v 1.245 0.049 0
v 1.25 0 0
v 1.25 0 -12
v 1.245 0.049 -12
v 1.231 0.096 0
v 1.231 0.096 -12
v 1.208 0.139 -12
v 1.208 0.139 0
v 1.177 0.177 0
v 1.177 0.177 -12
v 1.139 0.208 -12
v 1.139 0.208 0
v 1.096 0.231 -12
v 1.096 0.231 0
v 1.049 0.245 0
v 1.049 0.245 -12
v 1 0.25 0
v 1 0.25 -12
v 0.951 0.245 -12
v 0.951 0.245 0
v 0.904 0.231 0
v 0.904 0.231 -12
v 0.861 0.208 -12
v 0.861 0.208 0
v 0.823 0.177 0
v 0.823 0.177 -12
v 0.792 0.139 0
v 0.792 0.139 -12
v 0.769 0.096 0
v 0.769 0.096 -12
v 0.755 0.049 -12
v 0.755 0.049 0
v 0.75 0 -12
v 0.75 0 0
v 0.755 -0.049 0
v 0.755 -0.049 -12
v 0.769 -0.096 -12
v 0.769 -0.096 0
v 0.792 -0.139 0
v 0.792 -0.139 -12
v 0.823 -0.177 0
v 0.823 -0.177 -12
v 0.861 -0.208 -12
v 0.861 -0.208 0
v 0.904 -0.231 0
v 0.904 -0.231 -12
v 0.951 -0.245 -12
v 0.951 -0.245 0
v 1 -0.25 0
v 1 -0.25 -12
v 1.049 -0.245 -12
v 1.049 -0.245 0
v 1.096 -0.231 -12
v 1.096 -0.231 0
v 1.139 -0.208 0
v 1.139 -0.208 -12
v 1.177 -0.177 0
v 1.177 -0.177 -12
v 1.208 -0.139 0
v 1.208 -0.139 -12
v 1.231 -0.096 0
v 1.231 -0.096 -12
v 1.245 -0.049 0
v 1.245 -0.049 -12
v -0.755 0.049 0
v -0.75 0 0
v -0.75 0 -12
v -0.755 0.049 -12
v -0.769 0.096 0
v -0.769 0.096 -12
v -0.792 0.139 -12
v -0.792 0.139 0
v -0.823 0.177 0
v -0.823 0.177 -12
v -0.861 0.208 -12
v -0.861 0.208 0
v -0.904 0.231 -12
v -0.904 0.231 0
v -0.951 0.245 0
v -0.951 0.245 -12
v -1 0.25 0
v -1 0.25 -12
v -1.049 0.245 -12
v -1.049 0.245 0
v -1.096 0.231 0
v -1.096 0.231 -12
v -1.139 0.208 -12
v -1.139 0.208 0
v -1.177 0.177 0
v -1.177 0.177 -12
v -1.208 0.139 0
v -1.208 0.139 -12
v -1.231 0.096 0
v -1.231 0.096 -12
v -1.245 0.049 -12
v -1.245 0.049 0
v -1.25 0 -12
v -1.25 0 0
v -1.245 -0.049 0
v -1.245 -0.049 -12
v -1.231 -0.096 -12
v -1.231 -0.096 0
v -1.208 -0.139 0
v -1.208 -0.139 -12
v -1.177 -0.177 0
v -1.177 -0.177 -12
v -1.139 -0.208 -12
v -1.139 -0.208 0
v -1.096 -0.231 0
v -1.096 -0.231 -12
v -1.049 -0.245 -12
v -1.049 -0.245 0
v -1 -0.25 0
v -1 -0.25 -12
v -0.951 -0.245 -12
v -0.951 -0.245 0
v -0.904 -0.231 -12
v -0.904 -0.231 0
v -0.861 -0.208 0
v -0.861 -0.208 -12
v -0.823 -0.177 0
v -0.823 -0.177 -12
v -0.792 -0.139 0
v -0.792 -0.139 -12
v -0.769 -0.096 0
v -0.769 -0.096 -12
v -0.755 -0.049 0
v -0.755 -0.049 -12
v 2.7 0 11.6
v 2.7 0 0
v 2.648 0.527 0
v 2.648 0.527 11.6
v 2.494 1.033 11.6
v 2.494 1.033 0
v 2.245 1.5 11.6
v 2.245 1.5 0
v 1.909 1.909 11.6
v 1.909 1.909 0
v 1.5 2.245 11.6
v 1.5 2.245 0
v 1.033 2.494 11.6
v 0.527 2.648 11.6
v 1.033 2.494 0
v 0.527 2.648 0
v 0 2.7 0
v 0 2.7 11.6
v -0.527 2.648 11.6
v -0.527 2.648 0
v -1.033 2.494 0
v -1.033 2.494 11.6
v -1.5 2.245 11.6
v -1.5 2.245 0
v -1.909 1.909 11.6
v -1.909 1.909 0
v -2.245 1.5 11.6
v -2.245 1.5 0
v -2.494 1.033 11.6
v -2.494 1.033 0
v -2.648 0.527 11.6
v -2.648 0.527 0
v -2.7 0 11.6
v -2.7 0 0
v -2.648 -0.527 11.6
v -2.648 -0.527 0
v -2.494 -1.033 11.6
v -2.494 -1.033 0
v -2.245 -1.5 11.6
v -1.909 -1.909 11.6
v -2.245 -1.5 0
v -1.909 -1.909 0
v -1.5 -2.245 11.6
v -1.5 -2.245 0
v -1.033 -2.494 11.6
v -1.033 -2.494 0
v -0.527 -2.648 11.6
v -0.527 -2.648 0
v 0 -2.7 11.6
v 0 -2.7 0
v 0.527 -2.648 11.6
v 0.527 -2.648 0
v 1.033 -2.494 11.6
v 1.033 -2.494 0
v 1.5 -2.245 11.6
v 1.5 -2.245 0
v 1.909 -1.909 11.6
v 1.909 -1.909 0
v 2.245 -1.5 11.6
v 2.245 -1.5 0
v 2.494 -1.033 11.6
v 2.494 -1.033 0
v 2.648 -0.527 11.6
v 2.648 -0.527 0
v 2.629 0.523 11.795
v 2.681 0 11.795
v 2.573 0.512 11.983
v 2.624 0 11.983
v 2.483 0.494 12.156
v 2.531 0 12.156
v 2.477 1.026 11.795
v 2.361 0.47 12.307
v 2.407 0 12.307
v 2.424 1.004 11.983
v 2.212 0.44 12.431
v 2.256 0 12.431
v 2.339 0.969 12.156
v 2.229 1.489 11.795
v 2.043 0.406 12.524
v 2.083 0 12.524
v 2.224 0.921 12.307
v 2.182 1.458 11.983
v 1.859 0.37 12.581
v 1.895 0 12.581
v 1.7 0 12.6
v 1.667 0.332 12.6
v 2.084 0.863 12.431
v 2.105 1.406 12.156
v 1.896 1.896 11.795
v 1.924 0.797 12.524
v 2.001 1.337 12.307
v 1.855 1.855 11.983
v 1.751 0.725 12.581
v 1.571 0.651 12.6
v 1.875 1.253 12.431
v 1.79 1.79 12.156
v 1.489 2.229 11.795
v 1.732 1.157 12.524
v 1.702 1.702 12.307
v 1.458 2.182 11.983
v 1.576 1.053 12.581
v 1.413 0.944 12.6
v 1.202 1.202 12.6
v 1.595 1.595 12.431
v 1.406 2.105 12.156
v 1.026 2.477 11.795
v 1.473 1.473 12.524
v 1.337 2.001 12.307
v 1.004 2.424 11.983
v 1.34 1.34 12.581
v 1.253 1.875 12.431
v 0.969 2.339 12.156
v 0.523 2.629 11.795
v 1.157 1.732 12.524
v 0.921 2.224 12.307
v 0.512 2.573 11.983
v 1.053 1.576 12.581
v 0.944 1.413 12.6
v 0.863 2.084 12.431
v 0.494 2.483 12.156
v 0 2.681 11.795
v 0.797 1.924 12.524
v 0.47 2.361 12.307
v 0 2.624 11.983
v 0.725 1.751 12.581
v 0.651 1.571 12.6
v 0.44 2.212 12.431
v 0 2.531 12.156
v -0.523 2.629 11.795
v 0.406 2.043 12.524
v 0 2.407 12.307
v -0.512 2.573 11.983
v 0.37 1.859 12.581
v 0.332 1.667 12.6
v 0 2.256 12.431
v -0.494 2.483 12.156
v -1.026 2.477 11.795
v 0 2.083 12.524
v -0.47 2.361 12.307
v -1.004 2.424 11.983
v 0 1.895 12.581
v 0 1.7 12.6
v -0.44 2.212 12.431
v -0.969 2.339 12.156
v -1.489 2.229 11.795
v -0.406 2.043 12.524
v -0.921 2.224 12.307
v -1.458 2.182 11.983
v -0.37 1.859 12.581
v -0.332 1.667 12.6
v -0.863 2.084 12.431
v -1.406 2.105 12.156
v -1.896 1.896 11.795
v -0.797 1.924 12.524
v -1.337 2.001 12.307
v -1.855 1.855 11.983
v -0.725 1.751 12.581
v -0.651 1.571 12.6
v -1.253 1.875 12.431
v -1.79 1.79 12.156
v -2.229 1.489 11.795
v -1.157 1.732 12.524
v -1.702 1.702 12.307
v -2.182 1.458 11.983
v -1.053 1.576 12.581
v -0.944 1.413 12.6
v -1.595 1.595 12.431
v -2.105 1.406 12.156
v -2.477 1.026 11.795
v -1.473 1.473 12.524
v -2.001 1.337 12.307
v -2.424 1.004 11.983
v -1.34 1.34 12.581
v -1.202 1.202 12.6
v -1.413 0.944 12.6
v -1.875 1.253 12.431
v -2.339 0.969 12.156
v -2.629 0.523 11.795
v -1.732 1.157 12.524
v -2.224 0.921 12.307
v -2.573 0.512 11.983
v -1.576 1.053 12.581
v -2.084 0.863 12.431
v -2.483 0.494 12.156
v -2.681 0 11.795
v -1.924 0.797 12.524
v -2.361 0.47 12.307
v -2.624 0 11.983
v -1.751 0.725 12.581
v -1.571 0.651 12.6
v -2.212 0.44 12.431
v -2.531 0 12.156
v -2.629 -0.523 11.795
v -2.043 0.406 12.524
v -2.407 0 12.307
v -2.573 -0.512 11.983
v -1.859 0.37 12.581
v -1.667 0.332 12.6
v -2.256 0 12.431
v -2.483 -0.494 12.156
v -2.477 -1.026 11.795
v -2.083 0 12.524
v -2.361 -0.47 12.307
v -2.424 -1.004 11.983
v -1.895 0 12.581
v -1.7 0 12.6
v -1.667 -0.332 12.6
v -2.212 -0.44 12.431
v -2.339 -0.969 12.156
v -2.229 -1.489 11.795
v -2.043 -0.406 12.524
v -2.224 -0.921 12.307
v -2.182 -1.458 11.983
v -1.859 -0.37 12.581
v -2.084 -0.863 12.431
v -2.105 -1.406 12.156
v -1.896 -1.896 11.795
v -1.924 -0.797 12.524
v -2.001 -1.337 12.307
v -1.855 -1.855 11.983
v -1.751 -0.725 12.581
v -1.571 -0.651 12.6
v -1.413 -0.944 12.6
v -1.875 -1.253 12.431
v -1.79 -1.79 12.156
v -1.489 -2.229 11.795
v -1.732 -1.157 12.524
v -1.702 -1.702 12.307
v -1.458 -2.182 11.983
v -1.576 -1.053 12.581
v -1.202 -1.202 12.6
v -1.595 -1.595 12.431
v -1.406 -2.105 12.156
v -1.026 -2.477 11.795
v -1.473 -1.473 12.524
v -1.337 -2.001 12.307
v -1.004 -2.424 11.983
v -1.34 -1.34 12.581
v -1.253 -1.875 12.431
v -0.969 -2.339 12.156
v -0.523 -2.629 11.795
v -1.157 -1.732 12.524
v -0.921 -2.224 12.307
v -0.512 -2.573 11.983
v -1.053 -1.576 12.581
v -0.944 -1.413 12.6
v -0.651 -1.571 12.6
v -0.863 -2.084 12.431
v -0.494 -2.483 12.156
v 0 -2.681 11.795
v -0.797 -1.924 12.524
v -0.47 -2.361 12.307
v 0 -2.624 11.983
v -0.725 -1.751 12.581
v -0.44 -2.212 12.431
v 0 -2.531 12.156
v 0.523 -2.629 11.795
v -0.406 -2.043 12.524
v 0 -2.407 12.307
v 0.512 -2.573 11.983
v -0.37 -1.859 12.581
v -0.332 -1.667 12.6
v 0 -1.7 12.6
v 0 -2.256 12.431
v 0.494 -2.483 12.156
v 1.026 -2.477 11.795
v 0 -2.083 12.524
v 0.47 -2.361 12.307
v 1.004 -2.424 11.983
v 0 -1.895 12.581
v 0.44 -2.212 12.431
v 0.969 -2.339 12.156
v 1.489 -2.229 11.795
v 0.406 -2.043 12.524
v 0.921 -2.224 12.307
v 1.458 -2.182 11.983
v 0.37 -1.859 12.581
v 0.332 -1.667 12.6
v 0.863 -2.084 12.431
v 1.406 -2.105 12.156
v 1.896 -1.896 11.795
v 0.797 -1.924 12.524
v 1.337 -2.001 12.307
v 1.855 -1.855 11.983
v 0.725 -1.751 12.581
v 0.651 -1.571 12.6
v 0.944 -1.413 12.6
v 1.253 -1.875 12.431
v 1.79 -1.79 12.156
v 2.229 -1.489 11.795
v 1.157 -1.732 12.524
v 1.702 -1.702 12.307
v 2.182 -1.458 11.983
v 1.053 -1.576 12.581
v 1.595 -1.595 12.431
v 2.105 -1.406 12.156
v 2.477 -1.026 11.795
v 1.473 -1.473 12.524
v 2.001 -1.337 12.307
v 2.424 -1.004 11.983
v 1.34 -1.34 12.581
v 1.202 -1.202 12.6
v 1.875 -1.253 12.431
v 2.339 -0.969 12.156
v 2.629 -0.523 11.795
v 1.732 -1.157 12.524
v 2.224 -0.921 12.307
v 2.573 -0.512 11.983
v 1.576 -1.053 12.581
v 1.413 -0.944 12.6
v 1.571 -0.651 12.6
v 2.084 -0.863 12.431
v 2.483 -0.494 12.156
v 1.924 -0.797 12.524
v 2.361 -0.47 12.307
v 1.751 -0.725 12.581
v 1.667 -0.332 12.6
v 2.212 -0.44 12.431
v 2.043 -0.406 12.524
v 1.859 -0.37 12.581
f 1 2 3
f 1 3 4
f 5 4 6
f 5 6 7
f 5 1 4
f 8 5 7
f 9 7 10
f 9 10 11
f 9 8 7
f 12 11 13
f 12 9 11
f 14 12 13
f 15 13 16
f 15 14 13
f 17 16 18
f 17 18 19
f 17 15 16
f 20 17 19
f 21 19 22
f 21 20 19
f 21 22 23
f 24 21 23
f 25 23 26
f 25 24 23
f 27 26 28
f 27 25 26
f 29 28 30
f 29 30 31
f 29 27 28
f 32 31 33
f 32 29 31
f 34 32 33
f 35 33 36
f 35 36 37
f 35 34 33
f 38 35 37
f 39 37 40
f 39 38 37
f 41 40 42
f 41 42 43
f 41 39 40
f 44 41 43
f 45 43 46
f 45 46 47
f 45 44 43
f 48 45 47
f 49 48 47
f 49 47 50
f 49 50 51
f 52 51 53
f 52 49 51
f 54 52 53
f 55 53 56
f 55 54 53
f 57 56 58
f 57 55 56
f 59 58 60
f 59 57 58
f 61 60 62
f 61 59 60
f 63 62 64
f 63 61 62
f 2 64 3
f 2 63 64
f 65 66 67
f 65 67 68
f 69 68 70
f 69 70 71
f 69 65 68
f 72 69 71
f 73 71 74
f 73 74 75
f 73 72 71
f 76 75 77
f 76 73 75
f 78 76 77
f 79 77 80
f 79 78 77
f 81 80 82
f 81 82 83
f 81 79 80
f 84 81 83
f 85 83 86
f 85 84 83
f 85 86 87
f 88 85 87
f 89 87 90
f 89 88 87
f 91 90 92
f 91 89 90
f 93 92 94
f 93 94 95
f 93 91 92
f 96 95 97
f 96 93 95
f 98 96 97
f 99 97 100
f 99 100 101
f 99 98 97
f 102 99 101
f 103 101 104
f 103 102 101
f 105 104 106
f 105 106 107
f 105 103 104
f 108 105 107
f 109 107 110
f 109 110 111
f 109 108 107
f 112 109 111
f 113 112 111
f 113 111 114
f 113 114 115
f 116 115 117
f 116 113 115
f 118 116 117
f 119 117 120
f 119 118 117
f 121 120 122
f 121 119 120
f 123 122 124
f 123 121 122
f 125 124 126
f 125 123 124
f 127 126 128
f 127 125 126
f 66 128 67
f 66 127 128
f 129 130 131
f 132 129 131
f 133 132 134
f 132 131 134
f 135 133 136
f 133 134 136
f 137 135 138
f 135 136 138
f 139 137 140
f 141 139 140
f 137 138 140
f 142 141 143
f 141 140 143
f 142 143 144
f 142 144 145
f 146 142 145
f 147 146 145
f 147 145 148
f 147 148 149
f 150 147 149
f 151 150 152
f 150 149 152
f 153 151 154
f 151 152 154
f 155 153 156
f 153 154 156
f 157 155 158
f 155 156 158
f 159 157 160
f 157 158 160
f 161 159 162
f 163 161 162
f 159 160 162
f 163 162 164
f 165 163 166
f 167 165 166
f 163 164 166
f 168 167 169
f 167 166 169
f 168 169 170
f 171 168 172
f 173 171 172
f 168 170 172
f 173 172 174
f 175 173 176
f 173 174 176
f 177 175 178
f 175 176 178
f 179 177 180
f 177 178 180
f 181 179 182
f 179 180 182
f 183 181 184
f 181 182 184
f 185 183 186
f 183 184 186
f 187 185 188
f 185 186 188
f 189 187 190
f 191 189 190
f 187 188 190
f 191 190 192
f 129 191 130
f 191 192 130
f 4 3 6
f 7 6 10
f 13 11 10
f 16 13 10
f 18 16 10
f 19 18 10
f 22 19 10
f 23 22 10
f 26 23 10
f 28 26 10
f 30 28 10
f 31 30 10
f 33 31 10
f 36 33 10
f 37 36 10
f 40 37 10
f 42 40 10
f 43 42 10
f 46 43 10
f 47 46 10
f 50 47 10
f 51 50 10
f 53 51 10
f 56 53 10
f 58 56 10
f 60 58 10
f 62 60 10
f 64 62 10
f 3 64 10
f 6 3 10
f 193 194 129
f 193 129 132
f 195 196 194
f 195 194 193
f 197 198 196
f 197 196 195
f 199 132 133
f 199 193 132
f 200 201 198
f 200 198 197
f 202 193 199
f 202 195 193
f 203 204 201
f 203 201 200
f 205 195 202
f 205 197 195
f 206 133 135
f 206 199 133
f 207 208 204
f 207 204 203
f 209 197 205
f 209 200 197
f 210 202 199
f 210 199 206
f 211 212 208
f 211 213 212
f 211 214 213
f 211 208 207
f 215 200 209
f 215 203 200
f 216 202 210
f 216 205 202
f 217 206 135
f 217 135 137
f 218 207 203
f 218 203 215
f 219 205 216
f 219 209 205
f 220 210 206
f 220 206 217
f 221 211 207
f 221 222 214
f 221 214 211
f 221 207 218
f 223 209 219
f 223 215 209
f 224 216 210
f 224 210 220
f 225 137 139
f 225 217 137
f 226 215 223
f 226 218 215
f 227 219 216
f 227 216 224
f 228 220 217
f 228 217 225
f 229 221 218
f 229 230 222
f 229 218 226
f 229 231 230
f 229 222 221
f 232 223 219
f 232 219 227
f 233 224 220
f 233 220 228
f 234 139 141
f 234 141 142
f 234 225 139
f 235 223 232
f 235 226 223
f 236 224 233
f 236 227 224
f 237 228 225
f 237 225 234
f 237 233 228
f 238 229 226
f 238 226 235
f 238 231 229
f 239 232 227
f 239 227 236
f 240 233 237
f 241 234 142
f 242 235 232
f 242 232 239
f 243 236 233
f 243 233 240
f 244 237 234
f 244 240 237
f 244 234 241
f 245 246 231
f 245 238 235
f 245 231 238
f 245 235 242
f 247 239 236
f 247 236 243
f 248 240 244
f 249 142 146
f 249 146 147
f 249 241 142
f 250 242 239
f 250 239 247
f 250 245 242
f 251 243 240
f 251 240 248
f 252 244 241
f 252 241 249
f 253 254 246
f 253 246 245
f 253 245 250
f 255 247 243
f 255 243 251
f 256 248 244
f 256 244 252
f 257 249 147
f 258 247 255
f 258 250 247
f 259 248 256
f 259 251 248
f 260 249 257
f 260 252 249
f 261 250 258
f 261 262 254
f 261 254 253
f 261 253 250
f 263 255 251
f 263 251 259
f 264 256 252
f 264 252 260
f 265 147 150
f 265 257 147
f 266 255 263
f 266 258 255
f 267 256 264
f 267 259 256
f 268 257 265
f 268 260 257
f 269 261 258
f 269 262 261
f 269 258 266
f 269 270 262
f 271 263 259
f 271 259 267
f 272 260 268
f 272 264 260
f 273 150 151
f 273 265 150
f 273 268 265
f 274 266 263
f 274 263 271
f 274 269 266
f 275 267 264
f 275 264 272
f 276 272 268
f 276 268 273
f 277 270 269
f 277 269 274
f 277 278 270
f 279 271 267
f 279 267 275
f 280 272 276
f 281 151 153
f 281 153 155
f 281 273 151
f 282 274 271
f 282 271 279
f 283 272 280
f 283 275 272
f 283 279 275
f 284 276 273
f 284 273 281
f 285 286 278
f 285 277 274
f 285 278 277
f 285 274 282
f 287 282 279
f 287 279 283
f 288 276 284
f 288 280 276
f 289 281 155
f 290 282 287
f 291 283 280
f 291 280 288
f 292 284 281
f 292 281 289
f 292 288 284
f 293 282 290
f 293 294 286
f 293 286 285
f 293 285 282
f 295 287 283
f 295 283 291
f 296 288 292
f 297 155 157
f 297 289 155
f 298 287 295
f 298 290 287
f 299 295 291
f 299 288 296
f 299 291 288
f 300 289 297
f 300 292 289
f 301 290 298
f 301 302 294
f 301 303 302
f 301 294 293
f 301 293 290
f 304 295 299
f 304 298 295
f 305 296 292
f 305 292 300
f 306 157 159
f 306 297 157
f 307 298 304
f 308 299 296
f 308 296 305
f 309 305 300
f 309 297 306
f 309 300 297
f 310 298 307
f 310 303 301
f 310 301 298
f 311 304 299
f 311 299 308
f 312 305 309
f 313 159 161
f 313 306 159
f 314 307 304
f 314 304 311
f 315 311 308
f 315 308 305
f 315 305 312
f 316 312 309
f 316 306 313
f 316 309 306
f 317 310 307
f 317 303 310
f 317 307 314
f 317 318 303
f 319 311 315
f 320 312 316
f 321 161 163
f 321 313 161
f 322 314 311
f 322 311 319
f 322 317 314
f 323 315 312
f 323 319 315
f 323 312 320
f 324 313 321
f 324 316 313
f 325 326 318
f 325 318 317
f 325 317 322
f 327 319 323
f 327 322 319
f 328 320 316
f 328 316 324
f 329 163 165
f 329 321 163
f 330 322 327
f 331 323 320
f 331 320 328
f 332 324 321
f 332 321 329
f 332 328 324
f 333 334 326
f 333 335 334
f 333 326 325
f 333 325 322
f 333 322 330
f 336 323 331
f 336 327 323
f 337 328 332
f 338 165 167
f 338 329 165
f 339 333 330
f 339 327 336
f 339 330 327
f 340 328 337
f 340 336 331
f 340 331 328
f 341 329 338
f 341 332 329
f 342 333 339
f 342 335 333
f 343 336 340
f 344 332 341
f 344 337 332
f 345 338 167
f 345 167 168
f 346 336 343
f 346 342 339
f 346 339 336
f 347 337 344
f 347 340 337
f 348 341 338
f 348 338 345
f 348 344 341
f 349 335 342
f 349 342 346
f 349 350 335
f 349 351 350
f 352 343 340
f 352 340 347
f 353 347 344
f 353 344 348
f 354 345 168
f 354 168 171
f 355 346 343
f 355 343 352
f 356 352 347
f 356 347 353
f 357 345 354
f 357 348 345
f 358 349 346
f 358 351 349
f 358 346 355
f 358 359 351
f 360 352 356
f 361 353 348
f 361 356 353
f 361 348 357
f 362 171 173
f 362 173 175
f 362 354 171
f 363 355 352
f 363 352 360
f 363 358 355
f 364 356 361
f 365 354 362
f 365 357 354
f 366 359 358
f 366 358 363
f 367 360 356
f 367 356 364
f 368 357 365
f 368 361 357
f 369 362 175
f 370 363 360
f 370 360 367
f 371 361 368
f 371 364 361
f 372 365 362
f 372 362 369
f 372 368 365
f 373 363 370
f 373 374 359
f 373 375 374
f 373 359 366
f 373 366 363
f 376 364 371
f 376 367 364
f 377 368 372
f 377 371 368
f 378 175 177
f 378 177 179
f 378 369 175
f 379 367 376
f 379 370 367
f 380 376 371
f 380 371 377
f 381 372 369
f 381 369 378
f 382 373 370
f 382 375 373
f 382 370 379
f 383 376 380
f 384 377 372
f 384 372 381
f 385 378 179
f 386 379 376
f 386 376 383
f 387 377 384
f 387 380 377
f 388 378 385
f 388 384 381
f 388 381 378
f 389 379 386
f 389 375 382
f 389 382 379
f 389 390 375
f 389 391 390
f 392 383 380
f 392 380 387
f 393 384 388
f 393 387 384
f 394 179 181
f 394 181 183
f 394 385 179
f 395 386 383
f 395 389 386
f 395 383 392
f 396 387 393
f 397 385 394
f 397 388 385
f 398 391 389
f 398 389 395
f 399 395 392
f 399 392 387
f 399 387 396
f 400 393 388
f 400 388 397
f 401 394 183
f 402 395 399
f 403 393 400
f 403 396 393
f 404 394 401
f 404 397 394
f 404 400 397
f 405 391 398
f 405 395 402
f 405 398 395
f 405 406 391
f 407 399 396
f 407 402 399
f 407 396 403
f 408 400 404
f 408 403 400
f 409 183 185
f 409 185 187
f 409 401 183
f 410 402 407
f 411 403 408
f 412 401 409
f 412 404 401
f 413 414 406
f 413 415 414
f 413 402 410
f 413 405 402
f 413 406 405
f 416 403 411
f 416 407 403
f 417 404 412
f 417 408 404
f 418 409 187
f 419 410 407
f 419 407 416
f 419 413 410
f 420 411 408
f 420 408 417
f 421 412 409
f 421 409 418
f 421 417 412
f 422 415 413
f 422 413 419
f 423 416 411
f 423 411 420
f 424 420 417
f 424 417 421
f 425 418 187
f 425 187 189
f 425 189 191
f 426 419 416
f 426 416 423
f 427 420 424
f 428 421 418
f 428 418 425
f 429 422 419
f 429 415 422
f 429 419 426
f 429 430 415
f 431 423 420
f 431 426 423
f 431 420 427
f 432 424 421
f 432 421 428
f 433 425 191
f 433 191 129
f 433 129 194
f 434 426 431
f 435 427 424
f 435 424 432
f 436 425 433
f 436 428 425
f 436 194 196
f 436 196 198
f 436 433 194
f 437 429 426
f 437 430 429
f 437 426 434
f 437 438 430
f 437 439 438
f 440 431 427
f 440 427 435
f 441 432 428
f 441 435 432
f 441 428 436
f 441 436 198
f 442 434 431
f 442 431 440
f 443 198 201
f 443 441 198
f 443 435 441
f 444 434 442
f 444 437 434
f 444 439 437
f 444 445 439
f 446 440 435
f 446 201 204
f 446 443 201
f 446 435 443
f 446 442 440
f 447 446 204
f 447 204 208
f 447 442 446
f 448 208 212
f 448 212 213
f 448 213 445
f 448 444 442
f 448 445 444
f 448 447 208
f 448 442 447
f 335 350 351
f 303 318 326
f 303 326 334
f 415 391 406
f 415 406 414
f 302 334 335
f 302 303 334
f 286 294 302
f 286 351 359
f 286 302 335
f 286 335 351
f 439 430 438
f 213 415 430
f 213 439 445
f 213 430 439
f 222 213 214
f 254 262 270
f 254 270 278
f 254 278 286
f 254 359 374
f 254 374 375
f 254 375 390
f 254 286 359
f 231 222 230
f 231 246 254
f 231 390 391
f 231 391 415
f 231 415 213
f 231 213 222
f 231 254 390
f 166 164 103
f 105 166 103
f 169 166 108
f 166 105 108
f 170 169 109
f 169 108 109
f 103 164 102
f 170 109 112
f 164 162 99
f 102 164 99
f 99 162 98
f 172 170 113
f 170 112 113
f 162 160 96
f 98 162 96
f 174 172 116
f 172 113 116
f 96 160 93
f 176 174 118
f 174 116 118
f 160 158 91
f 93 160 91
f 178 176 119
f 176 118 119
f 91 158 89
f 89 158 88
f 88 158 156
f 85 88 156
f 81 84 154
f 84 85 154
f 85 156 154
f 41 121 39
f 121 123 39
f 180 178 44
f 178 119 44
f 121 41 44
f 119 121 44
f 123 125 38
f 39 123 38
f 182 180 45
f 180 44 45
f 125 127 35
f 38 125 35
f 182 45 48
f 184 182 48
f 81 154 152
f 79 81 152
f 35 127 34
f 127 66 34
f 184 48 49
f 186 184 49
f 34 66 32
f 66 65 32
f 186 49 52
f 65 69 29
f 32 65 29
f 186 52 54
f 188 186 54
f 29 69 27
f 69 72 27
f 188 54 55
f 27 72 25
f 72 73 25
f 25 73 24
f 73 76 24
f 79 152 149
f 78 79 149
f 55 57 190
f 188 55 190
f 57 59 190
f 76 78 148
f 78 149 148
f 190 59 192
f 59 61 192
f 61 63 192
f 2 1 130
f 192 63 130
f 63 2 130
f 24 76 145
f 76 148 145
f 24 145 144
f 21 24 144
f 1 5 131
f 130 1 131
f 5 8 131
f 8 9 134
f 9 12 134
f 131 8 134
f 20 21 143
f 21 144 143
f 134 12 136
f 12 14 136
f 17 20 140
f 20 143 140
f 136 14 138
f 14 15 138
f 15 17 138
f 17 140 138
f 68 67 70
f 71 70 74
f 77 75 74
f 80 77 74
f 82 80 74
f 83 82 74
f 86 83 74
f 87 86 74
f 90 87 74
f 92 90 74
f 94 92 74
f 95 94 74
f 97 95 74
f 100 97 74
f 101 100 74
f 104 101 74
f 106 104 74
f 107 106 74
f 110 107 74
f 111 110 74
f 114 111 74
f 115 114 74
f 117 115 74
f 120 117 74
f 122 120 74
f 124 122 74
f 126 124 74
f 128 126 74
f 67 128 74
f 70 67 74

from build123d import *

# Parameters (mm, degrees)
F0_R     = 2.7
F1_DEPTH = 12.6
F2_R     = 1
F3_R     = 0.25
F4_DEPTH = 12


with BuildPart() as f1:
    # F0 (on Top) → F1 (new body)
    with BuildSketch(Plane.XY):
        Circle(F0_R)
    extrude(amount=F1_DEPTH)

    # F2
    f2_edges = [f1.edges().sort_by_distance(p)[0] for p in [
        (-2.7, 0, 12.6),
    ]]
    fillet(f2_edges, radius=F2_R)

    # F3 (on Top) → F4 (join)
    with BuildSketch(Plane.XY):
        with Locations((-1, 0)):
            Circle(F3_R)
        with Locations((1, 0)):
            Circle(F3_R)
    extrude(amount=-F4_DEPTH)


solid = f1.part
